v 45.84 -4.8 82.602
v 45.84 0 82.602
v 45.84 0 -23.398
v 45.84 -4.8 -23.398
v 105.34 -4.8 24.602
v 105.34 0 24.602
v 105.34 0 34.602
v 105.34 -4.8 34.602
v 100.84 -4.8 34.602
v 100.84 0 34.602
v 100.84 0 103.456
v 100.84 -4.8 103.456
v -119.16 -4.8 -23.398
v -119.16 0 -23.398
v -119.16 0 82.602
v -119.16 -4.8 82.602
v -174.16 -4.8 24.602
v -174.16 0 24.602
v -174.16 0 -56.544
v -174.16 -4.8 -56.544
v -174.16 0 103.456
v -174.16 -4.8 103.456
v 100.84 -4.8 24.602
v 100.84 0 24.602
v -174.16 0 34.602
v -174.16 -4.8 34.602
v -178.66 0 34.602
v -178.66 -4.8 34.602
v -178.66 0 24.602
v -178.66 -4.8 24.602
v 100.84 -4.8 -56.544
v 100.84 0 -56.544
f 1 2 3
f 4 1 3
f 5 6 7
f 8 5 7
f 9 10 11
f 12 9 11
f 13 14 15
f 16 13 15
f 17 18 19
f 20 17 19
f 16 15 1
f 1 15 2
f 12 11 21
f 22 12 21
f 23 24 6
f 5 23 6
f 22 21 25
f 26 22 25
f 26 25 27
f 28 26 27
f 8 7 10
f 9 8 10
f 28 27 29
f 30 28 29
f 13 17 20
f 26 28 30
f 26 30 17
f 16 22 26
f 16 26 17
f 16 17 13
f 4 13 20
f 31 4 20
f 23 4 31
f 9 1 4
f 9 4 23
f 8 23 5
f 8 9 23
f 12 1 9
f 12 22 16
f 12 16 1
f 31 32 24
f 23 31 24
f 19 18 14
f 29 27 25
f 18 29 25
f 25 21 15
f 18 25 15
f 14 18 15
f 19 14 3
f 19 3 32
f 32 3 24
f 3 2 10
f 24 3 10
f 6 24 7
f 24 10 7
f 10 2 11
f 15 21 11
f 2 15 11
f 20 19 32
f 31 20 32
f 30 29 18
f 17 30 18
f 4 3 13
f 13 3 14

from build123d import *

# Parameters (mm, degrees)
F1_DEPTH = 4.8


# Not quite as in the source:
# - a feature names something its author has since deleted; it is built from what else it names


with BuildPart() as f1:
    # F0 (on Front) → F1 (new body)
    with BuildSketch(Plane.XZ):
        Polygon((-36.6599317901, 103.4564594077), (-174.1599317901, 103.4564594077), (-174.1599317901, 34.6020694077), (-174.1599317901, 29.6020694077), (-174.1599317901, 24.6020694077), (-174.1599317901, -56.5435405923), (-36.6599317901, -56.5435405923), (-36.6599317901, -23.3979305923), (-119.1599317901, -23.3979305923), (-119.1599317901, 82.6020694077), (-36.6599317901, 82.6020694077), align=None)
        Polygon((100.8400682099, 103.4564594077), (-36.6599317901, 103.4564594077), (-36.6599317901, 82.6020694077), (45.8400682099, 82.6020694077), (45.8400682099, -23.3979305923), (-36.6599317901, -23.3979305923), (-36.6599317901, -56.5435405923), (100.8400682099, -56.5435405923), (100.8400682099, 24.6020694077), (100.8400682099, 29.6020694077), (100.8400682099, 34.6020694077), align=None)
        Polygon((105.3400682099, 34.6020694077), (100.8400682099, 34.6020694077), (100.8400682099, 29.6020694077), (101.9359001704, 29.6020694077), (105.3400682099, 29.6020694077), align=None)
        Polygon((101.9359001704, 29.6020694077), (100.8400682099, 29.6020694077), (100.8400682099, 24.6020694077), (101.9359001704, 24.6020694077), (105.3400682099, 24.6020694077), (105.3400682099, 29.6020694077), align=None)
        Polygon((-174.1599317901, 29.6020694077), (-174.1599317901, 34.6020694077), (-178.6599317901, 34.6020694077), (-178.6599317901, 29.6020694077), (-175.2557637506, 29.6020694077), align=None)
        Polygon((-174.1599317901, 24.6020694077), (-174.1599317901, 29.6020694077), (-175.2557637506, 29.6020694077), (-178.6599317901, 29.6020694077), (-178.6599317901, 24.6020694077), (-175.2557637506, 24.6020694077), align=None)
    extrude(amount=F1_DEPTH)


solid = f1.part
